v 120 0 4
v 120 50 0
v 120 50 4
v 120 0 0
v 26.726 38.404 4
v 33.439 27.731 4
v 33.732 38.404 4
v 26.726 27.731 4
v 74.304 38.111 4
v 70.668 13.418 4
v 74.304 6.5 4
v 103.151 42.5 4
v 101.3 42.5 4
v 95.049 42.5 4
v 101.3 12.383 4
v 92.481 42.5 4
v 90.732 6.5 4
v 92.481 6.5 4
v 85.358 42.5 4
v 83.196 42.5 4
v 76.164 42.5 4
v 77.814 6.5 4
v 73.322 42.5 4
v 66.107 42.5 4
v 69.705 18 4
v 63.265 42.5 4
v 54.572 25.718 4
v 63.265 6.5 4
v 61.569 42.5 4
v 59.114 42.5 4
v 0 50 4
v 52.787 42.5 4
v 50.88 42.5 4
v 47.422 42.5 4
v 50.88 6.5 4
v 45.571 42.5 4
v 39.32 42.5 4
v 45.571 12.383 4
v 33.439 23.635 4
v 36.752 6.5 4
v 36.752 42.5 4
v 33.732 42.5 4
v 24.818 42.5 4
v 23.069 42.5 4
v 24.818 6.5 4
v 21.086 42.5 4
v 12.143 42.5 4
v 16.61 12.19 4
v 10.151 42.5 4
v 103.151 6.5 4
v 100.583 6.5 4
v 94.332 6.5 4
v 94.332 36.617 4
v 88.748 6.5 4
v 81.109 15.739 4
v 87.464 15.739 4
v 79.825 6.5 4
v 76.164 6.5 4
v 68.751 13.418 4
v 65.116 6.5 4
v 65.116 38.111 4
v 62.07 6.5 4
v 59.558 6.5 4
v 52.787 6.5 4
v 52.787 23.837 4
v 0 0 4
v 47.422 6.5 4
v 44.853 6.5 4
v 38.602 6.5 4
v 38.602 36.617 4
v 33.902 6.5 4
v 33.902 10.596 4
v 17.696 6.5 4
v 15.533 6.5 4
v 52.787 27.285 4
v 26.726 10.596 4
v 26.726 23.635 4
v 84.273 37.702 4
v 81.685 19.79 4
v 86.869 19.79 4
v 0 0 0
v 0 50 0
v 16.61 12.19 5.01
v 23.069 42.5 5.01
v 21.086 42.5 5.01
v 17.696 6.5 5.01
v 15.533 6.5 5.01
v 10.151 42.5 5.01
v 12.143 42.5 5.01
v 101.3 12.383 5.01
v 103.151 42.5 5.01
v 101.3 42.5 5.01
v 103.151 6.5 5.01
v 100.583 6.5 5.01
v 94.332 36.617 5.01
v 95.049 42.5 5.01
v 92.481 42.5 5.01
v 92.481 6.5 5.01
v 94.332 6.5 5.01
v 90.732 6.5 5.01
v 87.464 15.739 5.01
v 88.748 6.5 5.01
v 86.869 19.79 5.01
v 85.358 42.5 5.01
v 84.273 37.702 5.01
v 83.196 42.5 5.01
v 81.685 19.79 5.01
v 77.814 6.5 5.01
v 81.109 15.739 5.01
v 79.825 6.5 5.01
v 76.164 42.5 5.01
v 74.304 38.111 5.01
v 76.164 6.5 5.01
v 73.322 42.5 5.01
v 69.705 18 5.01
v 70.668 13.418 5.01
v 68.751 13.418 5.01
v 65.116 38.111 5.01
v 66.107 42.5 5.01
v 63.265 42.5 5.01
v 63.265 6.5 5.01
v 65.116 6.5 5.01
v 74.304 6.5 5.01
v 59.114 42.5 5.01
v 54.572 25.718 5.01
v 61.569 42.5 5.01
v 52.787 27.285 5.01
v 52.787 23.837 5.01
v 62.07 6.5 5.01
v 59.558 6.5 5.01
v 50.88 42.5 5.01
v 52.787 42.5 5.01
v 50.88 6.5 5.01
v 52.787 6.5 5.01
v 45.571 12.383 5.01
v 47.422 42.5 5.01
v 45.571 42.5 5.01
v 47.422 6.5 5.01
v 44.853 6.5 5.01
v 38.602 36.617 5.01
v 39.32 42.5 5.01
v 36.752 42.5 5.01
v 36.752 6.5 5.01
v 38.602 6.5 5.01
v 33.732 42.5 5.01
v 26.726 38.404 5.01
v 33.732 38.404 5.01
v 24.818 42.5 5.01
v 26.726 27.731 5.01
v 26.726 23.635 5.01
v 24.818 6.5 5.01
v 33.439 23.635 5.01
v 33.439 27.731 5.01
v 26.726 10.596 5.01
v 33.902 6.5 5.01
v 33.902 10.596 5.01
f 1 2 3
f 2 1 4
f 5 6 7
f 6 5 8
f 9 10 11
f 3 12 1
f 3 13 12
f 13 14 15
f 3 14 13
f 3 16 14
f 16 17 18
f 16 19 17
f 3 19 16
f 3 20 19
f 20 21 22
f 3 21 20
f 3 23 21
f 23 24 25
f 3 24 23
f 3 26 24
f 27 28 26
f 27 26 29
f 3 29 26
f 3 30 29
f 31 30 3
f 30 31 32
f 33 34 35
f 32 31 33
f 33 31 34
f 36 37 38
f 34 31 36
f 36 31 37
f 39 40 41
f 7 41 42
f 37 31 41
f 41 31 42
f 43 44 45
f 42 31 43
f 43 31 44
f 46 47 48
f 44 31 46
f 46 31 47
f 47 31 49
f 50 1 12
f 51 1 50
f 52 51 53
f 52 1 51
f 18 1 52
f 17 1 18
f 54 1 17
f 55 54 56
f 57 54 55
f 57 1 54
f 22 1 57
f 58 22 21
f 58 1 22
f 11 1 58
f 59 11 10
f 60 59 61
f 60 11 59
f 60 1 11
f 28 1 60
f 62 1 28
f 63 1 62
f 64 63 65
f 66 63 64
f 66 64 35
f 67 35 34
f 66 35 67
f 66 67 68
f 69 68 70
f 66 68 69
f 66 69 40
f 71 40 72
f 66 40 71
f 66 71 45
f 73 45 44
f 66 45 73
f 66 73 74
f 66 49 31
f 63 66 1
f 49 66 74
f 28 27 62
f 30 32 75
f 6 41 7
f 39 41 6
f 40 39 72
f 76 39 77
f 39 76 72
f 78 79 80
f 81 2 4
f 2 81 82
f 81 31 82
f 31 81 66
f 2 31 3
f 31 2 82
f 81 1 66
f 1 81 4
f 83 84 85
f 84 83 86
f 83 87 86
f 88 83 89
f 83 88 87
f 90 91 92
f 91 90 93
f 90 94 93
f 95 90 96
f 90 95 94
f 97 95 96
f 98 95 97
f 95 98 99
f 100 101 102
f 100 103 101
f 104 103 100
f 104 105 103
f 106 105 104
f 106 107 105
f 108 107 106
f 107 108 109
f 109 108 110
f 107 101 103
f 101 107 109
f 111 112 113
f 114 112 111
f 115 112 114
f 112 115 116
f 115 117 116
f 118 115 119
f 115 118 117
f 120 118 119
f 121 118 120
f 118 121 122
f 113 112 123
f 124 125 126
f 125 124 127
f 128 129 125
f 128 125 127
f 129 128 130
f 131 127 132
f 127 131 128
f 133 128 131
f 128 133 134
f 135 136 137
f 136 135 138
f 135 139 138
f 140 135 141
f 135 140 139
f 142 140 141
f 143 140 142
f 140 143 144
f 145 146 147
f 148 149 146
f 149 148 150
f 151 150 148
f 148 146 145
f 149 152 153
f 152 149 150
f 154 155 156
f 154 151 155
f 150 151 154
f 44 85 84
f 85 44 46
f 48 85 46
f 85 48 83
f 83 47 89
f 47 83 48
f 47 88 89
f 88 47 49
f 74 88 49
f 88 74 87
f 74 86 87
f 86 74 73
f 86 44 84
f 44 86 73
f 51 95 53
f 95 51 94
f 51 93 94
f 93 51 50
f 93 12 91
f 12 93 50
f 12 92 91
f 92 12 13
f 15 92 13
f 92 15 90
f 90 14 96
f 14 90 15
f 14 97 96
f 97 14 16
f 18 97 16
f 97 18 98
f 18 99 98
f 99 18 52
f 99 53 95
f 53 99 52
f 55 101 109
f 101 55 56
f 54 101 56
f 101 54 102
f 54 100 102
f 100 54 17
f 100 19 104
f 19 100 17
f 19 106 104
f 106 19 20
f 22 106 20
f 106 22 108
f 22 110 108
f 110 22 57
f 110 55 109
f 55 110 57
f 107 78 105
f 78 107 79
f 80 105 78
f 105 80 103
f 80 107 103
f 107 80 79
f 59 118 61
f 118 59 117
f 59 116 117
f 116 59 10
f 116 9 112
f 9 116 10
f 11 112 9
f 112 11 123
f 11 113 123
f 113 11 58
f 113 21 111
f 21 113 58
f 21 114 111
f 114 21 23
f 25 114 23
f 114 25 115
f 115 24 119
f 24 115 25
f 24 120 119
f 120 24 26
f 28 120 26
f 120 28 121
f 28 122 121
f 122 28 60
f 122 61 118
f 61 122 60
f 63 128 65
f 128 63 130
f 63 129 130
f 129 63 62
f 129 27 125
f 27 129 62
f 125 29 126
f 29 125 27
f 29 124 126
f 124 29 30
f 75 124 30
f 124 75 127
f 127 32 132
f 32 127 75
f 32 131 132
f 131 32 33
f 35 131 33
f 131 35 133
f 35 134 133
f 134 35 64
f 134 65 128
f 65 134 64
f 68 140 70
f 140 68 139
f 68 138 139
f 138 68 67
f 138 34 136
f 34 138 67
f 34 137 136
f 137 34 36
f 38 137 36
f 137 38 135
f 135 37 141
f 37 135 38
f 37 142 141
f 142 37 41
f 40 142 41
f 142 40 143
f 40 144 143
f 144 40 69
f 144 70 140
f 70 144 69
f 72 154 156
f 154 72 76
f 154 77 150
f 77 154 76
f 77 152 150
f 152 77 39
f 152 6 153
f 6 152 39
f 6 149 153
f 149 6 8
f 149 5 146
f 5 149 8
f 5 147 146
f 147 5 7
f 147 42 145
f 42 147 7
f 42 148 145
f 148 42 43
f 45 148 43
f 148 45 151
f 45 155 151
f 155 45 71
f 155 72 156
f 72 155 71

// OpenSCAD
color("black")
cube([120, 50, 4]);

color("red")
translate([10,6.5,0.01])
linear_extrude(height=5)
resize([93,36,0])
text(
    text="VENKMAN",
    font="Ghostbusters Nametag"
);
